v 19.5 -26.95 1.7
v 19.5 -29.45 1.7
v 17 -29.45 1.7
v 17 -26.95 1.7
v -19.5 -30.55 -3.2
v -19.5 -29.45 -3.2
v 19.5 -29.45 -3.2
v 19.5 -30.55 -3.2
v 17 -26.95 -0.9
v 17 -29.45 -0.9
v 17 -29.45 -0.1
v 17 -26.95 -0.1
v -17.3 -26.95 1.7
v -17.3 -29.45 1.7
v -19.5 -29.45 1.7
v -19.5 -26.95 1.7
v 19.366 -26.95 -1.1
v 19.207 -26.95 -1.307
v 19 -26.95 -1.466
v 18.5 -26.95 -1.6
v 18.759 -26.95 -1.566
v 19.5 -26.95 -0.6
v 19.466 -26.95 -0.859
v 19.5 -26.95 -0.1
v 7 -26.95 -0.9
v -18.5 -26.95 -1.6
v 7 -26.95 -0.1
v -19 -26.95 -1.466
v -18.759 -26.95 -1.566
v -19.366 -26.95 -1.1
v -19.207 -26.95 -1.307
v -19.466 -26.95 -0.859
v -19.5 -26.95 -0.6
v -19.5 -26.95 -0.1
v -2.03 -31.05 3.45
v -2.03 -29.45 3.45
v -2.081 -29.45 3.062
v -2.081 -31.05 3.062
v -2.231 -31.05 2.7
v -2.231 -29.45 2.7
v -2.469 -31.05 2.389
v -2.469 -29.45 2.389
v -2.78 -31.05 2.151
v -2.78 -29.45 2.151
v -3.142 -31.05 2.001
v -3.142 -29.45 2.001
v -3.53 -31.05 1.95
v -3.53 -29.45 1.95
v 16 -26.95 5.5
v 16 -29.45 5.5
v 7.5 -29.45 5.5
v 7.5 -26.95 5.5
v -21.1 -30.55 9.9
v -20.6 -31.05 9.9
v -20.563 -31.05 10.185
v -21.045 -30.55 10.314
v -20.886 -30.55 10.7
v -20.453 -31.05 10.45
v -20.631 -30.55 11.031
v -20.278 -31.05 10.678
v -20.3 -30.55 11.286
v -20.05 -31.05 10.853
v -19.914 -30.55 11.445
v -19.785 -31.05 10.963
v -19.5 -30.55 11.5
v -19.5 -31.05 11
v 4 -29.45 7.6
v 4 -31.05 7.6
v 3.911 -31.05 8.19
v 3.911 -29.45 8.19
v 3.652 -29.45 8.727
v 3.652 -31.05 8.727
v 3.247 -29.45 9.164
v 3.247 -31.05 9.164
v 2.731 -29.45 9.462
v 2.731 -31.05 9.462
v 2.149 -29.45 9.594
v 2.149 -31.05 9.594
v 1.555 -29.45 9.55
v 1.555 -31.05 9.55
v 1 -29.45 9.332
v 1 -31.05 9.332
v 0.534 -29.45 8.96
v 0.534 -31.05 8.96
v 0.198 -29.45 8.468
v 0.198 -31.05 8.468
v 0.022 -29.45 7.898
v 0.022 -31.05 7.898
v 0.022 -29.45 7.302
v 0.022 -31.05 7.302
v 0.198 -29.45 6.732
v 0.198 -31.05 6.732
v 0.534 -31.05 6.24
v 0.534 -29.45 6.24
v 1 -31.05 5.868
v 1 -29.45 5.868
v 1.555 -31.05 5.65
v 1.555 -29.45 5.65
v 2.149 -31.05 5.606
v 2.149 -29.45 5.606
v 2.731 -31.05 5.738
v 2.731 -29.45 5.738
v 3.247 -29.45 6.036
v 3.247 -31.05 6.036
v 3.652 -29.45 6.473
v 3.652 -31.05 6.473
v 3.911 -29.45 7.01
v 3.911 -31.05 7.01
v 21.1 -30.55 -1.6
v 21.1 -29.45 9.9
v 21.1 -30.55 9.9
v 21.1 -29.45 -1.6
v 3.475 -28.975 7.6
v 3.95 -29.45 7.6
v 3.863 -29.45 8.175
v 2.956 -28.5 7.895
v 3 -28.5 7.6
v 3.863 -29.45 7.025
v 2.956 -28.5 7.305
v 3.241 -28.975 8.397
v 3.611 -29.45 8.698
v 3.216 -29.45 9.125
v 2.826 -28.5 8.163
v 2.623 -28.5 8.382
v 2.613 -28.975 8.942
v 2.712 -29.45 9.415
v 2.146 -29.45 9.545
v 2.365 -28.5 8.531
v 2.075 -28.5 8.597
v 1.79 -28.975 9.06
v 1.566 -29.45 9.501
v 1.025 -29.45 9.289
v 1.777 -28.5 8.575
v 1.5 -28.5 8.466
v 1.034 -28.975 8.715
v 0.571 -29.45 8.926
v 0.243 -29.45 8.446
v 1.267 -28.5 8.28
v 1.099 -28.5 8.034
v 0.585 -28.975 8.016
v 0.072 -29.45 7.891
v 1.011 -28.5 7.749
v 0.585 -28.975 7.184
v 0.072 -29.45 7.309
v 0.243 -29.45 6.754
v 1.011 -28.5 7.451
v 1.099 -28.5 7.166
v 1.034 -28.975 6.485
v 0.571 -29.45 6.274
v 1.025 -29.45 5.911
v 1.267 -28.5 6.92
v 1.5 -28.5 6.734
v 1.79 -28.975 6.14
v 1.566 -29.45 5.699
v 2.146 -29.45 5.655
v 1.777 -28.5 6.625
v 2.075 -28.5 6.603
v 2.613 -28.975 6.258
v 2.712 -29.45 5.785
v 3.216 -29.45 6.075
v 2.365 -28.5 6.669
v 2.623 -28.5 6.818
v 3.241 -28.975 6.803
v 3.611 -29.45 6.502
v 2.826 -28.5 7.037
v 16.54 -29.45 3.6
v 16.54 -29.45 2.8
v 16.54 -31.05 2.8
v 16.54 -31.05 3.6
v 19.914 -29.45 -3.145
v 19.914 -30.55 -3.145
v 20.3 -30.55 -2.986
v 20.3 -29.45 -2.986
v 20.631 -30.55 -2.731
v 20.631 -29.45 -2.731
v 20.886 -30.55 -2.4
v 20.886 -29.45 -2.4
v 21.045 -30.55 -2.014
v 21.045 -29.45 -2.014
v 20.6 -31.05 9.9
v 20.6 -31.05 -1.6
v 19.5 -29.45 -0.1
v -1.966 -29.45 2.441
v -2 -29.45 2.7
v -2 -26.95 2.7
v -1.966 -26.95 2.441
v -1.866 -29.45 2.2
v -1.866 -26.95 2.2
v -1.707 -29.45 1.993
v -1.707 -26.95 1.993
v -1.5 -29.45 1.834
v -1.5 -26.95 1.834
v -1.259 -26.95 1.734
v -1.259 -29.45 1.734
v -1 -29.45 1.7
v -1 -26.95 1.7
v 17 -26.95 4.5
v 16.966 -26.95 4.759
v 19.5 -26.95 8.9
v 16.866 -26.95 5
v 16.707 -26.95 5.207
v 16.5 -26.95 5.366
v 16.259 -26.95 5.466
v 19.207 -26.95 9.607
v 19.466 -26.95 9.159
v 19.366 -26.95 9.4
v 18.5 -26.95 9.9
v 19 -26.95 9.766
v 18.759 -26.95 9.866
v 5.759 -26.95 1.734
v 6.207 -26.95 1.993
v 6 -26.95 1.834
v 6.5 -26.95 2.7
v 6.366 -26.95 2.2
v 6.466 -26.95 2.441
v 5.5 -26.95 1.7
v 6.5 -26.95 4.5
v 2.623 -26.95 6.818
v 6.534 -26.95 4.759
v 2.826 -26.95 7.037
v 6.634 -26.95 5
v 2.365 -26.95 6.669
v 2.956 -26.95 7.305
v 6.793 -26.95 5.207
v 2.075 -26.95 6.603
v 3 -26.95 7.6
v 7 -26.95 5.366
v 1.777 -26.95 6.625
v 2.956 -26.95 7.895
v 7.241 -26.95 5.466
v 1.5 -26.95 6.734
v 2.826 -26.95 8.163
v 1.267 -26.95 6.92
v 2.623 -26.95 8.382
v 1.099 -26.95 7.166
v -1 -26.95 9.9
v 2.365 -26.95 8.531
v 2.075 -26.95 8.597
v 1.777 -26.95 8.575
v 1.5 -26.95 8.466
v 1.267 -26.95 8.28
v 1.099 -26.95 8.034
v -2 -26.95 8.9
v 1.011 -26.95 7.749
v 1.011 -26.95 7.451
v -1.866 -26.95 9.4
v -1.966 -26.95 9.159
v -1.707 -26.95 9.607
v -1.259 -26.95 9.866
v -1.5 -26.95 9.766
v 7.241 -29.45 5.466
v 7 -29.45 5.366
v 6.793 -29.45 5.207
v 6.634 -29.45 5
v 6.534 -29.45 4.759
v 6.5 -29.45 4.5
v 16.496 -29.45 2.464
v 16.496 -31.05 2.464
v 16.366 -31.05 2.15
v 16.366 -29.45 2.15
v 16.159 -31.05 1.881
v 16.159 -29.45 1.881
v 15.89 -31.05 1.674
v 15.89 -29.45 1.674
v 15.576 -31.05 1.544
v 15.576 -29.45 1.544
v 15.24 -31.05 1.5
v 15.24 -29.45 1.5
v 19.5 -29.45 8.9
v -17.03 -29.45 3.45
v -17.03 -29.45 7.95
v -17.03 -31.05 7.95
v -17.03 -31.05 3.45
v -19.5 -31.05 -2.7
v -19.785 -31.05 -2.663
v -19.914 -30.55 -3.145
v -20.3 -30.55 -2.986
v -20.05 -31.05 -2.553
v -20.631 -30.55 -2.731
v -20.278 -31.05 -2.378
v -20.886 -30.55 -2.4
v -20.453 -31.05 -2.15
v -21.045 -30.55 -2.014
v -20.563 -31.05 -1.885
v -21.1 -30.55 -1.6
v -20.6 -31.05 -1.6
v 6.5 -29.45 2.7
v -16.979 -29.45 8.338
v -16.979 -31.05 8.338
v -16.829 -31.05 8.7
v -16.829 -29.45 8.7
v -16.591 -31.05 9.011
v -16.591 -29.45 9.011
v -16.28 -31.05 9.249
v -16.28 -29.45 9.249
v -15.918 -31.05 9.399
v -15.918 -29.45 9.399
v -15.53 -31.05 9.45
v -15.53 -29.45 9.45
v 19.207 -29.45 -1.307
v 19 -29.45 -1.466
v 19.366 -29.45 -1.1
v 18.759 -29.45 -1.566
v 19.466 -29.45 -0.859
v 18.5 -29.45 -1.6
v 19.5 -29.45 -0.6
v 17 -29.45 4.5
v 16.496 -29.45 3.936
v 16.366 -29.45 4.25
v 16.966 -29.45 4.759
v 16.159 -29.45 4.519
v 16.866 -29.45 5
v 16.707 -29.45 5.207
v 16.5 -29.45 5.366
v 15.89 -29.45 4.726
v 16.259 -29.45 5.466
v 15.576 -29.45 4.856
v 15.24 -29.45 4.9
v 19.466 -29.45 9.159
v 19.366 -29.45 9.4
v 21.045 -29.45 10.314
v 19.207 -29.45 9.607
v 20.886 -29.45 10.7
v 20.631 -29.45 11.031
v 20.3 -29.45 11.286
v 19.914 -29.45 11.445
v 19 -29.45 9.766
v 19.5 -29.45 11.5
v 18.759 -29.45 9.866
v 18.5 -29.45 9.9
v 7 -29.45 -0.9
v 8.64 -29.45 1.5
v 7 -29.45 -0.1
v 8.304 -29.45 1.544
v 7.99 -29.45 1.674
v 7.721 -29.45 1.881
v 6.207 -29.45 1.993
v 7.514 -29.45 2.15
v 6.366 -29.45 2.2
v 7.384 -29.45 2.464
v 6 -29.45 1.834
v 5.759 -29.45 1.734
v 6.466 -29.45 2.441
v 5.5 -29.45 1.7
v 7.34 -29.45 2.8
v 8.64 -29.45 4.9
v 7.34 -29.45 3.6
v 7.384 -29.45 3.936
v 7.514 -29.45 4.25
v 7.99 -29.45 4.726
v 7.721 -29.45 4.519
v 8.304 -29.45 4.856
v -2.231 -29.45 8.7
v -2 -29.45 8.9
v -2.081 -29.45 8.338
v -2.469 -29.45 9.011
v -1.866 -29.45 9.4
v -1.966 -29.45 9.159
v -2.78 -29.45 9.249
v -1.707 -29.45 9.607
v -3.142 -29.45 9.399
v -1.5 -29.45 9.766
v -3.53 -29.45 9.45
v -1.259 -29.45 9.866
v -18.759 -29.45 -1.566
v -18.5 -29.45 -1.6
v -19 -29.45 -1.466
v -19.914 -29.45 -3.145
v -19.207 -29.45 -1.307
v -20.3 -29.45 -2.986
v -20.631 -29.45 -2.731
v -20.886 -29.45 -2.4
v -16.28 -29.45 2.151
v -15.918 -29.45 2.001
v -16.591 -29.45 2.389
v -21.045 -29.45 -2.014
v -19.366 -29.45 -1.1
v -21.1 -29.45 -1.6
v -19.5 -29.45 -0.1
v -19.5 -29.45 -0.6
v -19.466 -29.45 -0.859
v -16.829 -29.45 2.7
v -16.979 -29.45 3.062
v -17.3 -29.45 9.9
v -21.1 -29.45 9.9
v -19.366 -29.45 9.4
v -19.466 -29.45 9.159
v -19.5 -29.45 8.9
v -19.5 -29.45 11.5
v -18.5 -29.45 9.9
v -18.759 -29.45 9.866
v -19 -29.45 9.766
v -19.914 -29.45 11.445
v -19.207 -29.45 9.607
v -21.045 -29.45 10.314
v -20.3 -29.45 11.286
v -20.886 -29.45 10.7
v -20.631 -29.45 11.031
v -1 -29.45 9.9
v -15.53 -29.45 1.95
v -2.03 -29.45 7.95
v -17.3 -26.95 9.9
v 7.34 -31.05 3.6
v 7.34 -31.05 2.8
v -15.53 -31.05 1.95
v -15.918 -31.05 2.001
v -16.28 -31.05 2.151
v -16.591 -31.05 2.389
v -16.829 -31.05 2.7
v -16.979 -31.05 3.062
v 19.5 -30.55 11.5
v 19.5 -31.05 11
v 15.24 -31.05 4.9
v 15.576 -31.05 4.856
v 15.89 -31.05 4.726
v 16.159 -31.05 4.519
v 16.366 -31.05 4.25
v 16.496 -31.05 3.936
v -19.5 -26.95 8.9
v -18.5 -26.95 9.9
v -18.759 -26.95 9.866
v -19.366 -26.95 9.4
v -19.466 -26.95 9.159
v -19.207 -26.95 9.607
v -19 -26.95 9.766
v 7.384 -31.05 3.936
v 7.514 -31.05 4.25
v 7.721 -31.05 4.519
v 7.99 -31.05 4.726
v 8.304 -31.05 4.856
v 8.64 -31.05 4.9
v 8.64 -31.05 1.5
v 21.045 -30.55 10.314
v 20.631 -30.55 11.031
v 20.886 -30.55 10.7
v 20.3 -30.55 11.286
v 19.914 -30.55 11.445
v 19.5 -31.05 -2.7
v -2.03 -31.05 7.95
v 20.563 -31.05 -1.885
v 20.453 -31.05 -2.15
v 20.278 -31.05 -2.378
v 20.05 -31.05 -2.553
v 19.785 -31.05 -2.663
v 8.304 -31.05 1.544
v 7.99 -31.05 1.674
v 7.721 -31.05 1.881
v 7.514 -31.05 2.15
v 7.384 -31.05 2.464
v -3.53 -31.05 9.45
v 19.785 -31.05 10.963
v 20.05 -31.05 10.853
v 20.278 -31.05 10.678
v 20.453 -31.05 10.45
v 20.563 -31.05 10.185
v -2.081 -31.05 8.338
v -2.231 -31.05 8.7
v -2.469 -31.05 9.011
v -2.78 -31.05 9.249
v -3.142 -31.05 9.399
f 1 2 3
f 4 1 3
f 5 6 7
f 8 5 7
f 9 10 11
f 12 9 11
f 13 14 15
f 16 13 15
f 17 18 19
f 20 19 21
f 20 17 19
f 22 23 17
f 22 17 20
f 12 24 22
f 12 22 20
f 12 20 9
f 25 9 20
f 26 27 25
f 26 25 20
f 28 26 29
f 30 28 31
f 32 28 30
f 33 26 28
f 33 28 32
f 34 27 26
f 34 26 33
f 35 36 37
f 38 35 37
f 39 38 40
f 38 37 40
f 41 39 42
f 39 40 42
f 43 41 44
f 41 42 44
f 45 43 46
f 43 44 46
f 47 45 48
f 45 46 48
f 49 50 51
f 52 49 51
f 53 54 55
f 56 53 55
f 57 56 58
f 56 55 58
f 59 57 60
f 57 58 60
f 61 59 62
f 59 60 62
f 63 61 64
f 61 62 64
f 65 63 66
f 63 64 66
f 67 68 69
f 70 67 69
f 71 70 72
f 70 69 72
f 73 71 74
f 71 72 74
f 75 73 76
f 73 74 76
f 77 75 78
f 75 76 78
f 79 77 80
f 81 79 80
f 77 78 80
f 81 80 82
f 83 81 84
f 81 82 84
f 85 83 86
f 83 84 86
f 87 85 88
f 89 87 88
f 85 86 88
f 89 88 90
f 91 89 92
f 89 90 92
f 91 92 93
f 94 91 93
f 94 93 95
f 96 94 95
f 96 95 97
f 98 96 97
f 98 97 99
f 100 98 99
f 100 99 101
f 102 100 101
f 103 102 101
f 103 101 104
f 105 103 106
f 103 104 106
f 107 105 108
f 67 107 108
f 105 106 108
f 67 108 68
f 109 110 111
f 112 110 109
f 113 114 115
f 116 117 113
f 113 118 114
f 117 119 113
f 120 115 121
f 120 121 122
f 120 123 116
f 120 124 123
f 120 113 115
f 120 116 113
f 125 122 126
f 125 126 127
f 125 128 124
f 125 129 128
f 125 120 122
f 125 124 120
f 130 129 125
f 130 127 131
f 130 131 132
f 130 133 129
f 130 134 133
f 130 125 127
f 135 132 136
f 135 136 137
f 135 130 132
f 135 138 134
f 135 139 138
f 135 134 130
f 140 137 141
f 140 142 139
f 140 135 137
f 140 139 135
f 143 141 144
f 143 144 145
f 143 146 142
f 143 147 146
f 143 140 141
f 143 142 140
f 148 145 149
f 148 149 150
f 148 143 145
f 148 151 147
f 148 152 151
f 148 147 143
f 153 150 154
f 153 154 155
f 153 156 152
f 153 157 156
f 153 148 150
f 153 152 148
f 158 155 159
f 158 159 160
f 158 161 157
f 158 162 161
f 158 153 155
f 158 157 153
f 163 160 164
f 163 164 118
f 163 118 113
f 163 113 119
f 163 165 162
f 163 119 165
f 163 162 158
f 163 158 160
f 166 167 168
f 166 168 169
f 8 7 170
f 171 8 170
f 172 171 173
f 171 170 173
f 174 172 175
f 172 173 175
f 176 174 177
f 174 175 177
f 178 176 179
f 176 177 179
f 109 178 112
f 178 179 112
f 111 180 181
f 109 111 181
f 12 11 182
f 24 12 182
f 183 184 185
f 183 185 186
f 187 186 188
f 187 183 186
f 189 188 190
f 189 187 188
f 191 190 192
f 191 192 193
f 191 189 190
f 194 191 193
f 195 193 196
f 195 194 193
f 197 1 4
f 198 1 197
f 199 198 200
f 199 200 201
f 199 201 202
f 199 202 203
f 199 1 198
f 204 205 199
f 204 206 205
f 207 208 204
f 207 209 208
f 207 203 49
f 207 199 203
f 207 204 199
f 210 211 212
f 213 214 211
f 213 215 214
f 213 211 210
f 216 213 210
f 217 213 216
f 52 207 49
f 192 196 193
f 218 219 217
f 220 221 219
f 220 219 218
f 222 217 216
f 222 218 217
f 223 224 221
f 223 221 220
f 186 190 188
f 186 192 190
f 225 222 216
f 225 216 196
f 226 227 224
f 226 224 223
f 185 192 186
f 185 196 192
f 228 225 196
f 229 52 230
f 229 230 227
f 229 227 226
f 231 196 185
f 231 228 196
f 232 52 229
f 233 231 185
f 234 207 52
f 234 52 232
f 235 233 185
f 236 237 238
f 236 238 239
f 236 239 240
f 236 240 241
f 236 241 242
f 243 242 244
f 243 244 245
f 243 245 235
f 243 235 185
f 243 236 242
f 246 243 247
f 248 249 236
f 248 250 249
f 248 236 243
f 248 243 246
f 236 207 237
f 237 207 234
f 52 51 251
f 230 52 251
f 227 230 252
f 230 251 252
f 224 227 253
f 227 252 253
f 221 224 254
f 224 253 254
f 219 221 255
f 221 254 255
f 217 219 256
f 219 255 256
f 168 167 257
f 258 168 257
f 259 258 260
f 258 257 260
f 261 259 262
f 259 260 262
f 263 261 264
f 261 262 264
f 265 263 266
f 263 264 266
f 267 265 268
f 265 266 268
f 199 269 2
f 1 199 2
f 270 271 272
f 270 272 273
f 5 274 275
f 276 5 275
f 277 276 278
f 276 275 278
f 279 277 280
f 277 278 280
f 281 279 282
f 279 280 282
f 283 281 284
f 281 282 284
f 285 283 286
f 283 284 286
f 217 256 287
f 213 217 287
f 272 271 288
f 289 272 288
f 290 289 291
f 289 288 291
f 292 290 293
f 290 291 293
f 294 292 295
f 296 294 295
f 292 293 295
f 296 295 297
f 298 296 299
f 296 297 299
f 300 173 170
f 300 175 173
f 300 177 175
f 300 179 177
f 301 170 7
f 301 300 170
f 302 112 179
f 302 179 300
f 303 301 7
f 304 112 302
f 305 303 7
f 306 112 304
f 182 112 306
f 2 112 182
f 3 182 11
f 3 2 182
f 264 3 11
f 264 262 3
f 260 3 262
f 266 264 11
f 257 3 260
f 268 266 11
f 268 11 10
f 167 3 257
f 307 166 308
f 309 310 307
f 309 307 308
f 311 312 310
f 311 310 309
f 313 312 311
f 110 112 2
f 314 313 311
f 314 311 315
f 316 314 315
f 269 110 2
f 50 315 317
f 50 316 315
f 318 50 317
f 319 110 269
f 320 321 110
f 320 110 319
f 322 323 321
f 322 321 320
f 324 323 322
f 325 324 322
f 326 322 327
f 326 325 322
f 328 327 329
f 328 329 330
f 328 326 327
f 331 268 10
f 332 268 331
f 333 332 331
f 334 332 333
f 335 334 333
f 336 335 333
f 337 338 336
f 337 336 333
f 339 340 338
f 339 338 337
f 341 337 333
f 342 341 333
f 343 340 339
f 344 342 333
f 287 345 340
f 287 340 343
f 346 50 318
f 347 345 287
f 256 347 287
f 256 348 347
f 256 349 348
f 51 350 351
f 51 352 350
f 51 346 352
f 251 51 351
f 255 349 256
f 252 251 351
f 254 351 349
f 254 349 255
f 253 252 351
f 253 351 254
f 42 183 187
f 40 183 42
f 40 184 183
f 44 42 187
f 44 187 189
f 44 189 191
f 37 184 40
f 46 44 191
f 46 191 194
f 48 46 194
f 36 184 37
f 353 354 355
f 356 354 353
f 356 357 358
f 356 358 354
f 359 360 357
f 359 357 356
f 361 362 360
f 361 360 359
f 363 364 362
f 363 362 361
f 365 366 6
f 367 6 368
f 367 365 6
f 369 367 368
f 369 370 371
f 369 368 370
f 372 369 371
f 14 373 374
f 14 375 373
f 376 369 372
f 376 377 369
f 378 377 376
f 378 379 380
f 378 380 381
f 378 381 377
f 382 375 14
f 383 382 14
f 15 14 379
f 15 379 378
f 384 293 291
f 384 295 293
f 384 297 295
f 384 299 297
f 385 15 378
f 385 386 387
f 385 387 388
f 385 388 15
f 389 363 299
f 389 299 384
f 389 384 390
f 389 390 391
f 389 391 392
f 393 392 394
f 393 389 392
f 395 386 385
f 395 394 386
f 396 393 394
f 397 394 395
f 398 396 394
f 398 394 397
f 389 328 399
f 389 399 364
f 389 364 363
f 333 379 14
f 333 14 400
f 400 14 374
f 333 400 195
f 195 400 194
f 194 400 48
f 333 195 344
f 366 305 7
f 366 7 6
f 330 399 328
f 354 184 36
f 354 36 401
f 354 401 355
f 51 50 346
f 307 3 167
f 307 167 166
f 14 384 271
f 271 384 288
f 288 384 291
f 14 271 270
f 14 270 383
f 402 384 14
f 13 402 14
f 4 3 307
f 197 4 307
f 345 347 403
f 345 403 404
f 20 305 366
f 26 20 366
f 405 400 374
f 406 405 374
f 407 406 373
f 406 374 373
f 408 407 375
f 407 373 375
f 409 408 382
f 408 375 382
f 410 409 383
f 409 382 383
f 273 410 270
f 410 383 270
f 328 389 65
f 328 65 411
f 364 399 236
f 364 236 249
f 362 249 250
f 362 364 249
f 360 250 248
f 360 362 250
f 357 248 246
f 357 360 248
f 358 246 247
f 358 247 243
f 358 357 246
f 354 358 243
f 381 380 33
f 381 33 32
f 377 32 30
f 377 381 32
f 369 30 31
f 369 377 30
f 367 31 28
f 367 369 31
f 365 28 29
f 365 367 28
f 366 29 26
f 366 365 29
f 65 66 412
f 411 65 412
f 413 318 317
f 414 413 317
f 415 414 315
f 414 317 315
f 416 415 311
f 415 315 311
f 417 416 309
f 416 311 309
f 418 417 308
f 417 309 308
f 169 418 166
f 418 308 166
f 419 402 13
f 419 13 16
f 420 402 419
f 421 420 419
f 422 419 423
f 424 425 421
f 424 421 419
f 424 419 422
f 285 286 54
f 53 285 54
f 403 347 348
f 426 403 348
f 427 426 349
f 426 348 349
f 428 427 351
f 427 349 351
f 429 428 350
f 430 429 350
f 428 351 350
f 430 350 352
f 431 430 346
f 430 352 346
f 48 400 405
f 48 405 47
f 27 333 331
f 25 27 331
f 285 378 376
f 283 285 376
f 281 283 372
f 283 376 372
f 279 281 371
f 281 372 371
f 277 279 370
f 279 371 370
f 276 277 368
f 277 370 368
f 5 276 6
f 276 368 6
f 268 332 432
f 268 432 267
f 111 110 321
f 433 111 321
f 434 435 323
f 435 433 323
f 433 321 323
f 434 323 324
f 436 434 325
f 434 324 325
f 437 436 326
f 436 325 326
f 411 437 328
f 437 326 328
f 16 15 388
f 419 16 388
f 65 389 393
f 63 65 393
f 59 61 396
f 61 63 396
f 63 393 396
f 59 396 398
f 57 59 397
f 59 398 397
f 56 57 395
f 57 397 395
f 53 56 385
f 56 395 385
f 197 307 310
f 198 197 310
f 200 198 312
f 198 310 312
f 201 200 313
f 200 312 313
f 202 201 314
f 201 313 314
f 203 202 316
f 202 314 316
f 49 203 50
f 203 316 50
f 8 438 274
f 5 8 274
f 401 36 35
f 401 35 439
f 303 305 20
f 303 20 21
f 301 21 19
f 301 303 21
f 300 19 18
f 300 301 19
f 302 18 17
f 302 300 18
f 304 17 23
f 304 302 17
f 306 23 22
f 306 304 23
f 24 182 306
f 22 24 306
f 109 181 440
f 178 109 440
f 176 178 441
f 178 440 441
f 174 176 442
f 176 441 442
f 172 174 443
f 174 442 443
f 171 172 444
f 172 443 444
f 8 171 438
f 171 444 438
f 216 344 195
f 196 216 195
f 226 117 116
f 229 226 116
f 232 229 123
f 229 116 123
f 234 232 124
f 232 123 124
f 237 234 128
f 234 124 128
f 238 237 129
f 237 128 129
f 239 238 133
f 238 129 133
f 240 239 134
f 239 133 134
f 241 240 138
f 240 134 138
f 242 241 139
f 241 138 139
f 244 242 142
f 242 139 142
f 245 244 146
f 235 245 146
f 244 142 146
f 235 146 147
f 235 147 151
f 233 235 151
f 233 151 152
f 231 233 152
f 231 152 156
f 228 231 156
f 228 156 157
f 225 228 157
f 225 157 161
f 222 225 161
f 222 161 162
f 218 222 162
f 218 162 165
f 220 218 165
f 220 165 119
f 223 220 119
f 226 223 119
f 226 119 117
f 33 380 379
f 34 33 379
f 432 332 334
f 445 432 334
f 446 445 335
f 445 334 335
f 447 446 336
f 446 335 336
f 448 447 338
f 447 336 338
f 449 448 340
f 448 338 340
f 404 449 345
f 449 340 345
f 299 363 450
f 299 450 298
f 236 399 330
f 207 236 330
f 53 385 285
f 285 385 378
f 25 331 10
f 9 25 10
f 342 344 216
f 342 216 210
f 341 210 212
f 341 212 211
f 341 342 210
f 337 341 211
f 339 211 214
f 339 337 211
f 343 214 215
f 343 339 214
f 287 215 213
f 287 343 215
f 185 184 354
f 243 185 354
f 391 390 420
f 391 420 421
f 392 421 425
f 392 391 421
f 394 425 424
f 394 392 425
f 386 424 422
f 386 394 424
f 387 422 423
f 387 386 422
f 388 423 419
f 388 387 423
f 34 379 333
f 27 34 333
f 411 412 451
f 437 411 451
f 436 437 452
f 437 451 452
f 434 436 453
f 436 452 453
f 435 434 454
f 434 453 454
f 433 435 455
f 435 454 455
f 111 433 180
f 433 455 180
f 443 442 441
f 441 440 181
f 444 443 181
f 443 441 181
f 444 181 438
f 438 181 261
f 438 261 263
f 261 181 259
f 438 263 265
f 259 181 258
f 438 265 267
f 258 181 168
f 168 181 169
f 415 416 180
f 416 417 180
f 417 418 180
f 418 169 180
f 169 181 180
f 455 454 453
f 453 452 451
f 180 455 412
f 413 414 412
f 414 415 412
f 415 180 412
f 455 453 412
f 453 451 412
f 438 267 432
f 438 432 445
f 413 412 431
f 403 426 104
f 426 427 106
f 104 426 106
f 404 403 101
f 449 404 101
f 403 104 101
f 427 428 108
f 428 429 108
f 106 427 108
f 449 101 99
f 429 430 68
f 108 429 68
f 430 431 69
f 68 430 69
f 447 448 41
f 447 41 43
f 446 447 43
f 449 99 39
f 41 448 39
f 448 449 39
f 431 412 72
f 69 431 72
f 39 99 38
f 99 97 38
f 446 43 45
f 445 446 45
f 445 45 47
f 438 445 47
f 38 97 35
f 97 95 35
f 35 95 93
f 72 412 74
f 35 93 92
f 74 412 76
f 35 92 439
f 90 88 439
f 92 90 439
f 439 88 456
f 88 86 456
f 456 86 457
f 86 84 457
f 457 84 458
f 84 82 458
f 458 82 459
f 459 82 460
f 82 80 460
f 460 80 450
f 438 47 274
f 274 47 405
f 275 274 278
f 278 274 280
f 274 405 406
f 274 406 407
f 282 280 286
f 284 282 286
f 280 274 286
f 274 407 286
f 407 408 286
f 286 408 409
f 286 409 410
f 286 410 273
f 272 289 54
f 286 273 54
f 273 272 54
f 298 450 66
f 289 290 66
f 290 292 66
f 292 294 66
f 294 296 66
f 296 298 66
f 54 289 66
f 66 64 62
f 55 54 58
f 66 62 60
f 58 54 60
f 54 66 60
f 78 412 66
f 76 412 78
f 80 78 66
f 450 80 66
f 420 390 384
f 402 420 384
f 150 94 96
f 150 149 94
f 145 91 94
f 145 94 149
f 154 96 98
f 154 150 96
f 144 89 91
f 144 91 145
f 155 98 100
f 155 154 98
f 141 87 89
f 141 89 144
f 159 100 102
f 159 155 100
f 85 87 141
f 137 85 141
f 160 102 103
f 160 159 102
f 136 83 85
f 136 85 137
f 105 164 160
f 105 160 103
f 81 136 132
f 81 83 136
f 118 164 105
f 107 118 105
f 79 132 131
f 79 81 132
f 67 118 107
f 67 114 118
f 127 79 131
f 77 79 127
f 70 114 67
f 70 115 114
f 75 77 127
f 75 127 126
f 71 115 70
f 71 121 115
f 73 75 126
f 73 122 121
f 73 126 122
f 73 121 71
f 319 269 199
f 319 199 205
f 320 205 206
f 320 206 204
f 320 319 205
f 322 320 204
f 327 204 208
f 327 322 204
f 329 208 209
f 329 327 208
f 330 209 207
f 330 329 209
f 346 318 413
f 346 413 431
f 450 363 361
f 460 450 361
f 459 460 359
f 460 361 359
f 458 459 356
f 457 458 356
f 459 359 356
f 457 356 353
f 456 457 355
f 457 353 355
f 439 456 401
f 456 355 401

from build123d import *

# Parameters (mm, degrees)
PAD_DEPTH       = 1.6
CHAMFER_SIZE    = 0.5
POCKET_DEPTH    = 1.601
PAD018_DEPTH    = 2.5
SKETCH028_R     = 2
POCKET006_DEPTH = 1.6
SKETCH029_R     = 1
POCKET007_DEPTH = 2.501
CHAMFER003_SIZE = 0.95


with BuildPart() as part:
    # Sketch (on Face1 of Binder) → Pad (new body)
    with BuildSketch(Plane.XZ.offset(29.45)):
        with BuildLine():
            Line((-19.5, 11.5), (19.5, 11.5))
            ThreePointArc((21.1, 9.9), (20.631371, 11.031371), (19.5, 11.5))
            Line((21.1, 9.9), (21.1, -1.6))
            ThreePointArc((19.5, -3.2), (20.631371, -2.731371), (21.1, -1.6))
            Line((-19.5, -3.2), (19.5, -3.2))
            ThreePointArc((-21.1, -1.6), (-20.631371, -2.731371), (-19.5, -3.2))
            Line((-21.1, 9.9), (-21.1, -1.6))
            ThreePointArc((-19.5, 11.5), (-20.631371, 11.031371), (-21.1, 9.9))
        make_face()
    extrude(amount=PAD_DEPTH)

    # Chamfer
    chamfer_edges = [part.edges().sort_by_distance(p)[0] for p in [
        (0, -31.05, 11.5),
    ]]
    chamfer(chamfer_edges, length=CHAMFER_SIZE)

    # Sketch023 (on Face4 of Chamfer) → Pocket (cut, through all)
    with BuildSketch(Plane(origin=(0, -29.45, 0), x_dir=(-1, 0, 0), z_dir=(0, 1, 0))):
        with BuildLine():
            Line((3.53, 9.45), (15.53, 9.45))
            ThreePointArc((17.03, 7.95), (16.59066, 9.01066), (15.53, 9.45))
            Line((17.03, 7.95), (17.03, 3.45))
            ThreePointArc((15.53, 1.95), (16.59066, 2.38934), (17.03, 3.45))
            Line((15.53, 1.95), (3.53, 1.95))
            ThreePointArc((2.03, 3.45), (2.46934, 2.38934), (3.53, 1.95))
            Line((2.03, 3.45), (2.03, 7.95))
            ThreePointArc((3.53, 9.45), (2.46934, 9.01066), (2.03, 7.95))
        make_face()
        with BuildLine():
            ThreePointArc((-15.24, 4.9), (-16.159239, 4.519239), (-16.54, 3.6))
            Line((-16.54, 2.8), (-16.54, 3.6))
            ThreePointArc((-16.54, 2.8), (-16.159239, 1.880761), (-15.24, 1.5))
            Line((-8.64, 1.5), (-15.24, 1.5))
            ThreePointArc((-8.64, 1.5), (-7.720761, 1.880761), (-7.34, 2.8))
            Line((-7.34, 3.6), (-7.34, 2.8))
            ThreePointArc((-7.34, 3.6), (-7.720761, 4.519239), (-8.64, 4.9))
            Line((-15.24, 4.9), (-8.64, 4.9))
        make_face()
    extrude(amount=-POCKET_DEPTH, mode=Mode.SUBTRACT)

    # Sketch024 (on Face1 of Binder) → Pad018 (join)
    with BuildSketch(Plane.XZ.offset(29.45)):
        with BuildLine():
            Line((-1, 9.9), (18.5, 9.9))
            ThreePointArc((19.5, 8.9), (19.207107, 9.607107), (18.5, 9.9))
            Line((19.5, 8.9), (19.5, 1.7))
            Line((19.5, 1.7), (17, 1.7))
            Line((17, 1.7), (17, 4.5))
            ThreePointArc((17, 4.5), (16.707107, 5.207107), (16, 5.5))
            Line((16, 5.5), (7.5, 5.5))
            ThreePointArc((7.5, 5.5), (6.792893, 5.207107), (6.5, 4.5))
            Line((6.5, 4.5), (6.5, 2.7))
            ThreePointArc((5.5, 1.7), (6.207107, 1.992893), (6.5, 2.7))
            Line((5.5, 1.7), (-1, 1.7))
            ThreePointArc((-2, 2.7), (-1.707107, 1.992893), (-1, 1.7))
            Line((-2, 2.7), (-2, 8.9))
            ThreePointArc((-1, 9.9), (-1.707107, 9.607107), (-2, 8.9))
        make_face()
        with BuildLine():
            Line((-19.5, -0.1), (7, -0.1))
            Line((7, -0.1), (7, -0.9))
            Line((7, -0.9), (17, -0.9))
            Line((17, -0.9), (17, -0.1))
            Line((17, -0.1), (19.5, -0.1))
            Line((19.5, -0.1), (19.5, -0.6))
            ThreePointArc((18.5, -1.6), (19.207107, -1.307107), (19.5, -0.6))
            Line((18.5, -1.6), (-18.5, -1.6))
            ThreePointArc((-19.5, -0.6), (-19.207107, -1.307107), (-18.5, -1.6))
            Line((-19.5, -0.6), (-19.5, -0.1))
        make_face()
        with BuildLine():
            Line((-18.5, 9.9), (-17.3, 9.9))
            Line((-17.3, 9.9), (-17.3, 1.7))
            Line((-17.3, 1.7), (-19.5, 1.7))
            Line((-19.5, 1.7), (-19.5, 8.9))
            ThreePointArc((-18.5, 9.9), (-19.207107, 9.607107), (-19.5, 8.9))
        make_face()
    extrude(amount=-PAD018_DEPTH)

    # Sketch028 (on Face9 of Pad018) → Pocket006 (cut)
    with BuildSketch(Plane.XZ.offset(31.05)):
        with Locations((2, 7.6)):
            Circle(SKETCH028_R)
    extrude(amount=-POCKET006_DEPTH, mode=Mode.SUBTRACT)

    # Sketch029 (on Face68 of Pocket006) → Pocket007 (cut, through all)
    with BuildSketch(Plane.XZ.offset(29.45)):
        with Locations((2, 7.6)):
            Circle(SKETCH029_R)
    extrude(amount=-POCKET007_DEPTH, mode=Mode.SUBTRACT)

    # Chamfer003
    chamfer003_edges = [part.edges().sort_by_distance(p)[0] for p in [
        (1, -29.45, 7.6),
    ]]
    chamfer(chamfer003_edges, length=CHAMFER003_SIZE)


solid = part.part
